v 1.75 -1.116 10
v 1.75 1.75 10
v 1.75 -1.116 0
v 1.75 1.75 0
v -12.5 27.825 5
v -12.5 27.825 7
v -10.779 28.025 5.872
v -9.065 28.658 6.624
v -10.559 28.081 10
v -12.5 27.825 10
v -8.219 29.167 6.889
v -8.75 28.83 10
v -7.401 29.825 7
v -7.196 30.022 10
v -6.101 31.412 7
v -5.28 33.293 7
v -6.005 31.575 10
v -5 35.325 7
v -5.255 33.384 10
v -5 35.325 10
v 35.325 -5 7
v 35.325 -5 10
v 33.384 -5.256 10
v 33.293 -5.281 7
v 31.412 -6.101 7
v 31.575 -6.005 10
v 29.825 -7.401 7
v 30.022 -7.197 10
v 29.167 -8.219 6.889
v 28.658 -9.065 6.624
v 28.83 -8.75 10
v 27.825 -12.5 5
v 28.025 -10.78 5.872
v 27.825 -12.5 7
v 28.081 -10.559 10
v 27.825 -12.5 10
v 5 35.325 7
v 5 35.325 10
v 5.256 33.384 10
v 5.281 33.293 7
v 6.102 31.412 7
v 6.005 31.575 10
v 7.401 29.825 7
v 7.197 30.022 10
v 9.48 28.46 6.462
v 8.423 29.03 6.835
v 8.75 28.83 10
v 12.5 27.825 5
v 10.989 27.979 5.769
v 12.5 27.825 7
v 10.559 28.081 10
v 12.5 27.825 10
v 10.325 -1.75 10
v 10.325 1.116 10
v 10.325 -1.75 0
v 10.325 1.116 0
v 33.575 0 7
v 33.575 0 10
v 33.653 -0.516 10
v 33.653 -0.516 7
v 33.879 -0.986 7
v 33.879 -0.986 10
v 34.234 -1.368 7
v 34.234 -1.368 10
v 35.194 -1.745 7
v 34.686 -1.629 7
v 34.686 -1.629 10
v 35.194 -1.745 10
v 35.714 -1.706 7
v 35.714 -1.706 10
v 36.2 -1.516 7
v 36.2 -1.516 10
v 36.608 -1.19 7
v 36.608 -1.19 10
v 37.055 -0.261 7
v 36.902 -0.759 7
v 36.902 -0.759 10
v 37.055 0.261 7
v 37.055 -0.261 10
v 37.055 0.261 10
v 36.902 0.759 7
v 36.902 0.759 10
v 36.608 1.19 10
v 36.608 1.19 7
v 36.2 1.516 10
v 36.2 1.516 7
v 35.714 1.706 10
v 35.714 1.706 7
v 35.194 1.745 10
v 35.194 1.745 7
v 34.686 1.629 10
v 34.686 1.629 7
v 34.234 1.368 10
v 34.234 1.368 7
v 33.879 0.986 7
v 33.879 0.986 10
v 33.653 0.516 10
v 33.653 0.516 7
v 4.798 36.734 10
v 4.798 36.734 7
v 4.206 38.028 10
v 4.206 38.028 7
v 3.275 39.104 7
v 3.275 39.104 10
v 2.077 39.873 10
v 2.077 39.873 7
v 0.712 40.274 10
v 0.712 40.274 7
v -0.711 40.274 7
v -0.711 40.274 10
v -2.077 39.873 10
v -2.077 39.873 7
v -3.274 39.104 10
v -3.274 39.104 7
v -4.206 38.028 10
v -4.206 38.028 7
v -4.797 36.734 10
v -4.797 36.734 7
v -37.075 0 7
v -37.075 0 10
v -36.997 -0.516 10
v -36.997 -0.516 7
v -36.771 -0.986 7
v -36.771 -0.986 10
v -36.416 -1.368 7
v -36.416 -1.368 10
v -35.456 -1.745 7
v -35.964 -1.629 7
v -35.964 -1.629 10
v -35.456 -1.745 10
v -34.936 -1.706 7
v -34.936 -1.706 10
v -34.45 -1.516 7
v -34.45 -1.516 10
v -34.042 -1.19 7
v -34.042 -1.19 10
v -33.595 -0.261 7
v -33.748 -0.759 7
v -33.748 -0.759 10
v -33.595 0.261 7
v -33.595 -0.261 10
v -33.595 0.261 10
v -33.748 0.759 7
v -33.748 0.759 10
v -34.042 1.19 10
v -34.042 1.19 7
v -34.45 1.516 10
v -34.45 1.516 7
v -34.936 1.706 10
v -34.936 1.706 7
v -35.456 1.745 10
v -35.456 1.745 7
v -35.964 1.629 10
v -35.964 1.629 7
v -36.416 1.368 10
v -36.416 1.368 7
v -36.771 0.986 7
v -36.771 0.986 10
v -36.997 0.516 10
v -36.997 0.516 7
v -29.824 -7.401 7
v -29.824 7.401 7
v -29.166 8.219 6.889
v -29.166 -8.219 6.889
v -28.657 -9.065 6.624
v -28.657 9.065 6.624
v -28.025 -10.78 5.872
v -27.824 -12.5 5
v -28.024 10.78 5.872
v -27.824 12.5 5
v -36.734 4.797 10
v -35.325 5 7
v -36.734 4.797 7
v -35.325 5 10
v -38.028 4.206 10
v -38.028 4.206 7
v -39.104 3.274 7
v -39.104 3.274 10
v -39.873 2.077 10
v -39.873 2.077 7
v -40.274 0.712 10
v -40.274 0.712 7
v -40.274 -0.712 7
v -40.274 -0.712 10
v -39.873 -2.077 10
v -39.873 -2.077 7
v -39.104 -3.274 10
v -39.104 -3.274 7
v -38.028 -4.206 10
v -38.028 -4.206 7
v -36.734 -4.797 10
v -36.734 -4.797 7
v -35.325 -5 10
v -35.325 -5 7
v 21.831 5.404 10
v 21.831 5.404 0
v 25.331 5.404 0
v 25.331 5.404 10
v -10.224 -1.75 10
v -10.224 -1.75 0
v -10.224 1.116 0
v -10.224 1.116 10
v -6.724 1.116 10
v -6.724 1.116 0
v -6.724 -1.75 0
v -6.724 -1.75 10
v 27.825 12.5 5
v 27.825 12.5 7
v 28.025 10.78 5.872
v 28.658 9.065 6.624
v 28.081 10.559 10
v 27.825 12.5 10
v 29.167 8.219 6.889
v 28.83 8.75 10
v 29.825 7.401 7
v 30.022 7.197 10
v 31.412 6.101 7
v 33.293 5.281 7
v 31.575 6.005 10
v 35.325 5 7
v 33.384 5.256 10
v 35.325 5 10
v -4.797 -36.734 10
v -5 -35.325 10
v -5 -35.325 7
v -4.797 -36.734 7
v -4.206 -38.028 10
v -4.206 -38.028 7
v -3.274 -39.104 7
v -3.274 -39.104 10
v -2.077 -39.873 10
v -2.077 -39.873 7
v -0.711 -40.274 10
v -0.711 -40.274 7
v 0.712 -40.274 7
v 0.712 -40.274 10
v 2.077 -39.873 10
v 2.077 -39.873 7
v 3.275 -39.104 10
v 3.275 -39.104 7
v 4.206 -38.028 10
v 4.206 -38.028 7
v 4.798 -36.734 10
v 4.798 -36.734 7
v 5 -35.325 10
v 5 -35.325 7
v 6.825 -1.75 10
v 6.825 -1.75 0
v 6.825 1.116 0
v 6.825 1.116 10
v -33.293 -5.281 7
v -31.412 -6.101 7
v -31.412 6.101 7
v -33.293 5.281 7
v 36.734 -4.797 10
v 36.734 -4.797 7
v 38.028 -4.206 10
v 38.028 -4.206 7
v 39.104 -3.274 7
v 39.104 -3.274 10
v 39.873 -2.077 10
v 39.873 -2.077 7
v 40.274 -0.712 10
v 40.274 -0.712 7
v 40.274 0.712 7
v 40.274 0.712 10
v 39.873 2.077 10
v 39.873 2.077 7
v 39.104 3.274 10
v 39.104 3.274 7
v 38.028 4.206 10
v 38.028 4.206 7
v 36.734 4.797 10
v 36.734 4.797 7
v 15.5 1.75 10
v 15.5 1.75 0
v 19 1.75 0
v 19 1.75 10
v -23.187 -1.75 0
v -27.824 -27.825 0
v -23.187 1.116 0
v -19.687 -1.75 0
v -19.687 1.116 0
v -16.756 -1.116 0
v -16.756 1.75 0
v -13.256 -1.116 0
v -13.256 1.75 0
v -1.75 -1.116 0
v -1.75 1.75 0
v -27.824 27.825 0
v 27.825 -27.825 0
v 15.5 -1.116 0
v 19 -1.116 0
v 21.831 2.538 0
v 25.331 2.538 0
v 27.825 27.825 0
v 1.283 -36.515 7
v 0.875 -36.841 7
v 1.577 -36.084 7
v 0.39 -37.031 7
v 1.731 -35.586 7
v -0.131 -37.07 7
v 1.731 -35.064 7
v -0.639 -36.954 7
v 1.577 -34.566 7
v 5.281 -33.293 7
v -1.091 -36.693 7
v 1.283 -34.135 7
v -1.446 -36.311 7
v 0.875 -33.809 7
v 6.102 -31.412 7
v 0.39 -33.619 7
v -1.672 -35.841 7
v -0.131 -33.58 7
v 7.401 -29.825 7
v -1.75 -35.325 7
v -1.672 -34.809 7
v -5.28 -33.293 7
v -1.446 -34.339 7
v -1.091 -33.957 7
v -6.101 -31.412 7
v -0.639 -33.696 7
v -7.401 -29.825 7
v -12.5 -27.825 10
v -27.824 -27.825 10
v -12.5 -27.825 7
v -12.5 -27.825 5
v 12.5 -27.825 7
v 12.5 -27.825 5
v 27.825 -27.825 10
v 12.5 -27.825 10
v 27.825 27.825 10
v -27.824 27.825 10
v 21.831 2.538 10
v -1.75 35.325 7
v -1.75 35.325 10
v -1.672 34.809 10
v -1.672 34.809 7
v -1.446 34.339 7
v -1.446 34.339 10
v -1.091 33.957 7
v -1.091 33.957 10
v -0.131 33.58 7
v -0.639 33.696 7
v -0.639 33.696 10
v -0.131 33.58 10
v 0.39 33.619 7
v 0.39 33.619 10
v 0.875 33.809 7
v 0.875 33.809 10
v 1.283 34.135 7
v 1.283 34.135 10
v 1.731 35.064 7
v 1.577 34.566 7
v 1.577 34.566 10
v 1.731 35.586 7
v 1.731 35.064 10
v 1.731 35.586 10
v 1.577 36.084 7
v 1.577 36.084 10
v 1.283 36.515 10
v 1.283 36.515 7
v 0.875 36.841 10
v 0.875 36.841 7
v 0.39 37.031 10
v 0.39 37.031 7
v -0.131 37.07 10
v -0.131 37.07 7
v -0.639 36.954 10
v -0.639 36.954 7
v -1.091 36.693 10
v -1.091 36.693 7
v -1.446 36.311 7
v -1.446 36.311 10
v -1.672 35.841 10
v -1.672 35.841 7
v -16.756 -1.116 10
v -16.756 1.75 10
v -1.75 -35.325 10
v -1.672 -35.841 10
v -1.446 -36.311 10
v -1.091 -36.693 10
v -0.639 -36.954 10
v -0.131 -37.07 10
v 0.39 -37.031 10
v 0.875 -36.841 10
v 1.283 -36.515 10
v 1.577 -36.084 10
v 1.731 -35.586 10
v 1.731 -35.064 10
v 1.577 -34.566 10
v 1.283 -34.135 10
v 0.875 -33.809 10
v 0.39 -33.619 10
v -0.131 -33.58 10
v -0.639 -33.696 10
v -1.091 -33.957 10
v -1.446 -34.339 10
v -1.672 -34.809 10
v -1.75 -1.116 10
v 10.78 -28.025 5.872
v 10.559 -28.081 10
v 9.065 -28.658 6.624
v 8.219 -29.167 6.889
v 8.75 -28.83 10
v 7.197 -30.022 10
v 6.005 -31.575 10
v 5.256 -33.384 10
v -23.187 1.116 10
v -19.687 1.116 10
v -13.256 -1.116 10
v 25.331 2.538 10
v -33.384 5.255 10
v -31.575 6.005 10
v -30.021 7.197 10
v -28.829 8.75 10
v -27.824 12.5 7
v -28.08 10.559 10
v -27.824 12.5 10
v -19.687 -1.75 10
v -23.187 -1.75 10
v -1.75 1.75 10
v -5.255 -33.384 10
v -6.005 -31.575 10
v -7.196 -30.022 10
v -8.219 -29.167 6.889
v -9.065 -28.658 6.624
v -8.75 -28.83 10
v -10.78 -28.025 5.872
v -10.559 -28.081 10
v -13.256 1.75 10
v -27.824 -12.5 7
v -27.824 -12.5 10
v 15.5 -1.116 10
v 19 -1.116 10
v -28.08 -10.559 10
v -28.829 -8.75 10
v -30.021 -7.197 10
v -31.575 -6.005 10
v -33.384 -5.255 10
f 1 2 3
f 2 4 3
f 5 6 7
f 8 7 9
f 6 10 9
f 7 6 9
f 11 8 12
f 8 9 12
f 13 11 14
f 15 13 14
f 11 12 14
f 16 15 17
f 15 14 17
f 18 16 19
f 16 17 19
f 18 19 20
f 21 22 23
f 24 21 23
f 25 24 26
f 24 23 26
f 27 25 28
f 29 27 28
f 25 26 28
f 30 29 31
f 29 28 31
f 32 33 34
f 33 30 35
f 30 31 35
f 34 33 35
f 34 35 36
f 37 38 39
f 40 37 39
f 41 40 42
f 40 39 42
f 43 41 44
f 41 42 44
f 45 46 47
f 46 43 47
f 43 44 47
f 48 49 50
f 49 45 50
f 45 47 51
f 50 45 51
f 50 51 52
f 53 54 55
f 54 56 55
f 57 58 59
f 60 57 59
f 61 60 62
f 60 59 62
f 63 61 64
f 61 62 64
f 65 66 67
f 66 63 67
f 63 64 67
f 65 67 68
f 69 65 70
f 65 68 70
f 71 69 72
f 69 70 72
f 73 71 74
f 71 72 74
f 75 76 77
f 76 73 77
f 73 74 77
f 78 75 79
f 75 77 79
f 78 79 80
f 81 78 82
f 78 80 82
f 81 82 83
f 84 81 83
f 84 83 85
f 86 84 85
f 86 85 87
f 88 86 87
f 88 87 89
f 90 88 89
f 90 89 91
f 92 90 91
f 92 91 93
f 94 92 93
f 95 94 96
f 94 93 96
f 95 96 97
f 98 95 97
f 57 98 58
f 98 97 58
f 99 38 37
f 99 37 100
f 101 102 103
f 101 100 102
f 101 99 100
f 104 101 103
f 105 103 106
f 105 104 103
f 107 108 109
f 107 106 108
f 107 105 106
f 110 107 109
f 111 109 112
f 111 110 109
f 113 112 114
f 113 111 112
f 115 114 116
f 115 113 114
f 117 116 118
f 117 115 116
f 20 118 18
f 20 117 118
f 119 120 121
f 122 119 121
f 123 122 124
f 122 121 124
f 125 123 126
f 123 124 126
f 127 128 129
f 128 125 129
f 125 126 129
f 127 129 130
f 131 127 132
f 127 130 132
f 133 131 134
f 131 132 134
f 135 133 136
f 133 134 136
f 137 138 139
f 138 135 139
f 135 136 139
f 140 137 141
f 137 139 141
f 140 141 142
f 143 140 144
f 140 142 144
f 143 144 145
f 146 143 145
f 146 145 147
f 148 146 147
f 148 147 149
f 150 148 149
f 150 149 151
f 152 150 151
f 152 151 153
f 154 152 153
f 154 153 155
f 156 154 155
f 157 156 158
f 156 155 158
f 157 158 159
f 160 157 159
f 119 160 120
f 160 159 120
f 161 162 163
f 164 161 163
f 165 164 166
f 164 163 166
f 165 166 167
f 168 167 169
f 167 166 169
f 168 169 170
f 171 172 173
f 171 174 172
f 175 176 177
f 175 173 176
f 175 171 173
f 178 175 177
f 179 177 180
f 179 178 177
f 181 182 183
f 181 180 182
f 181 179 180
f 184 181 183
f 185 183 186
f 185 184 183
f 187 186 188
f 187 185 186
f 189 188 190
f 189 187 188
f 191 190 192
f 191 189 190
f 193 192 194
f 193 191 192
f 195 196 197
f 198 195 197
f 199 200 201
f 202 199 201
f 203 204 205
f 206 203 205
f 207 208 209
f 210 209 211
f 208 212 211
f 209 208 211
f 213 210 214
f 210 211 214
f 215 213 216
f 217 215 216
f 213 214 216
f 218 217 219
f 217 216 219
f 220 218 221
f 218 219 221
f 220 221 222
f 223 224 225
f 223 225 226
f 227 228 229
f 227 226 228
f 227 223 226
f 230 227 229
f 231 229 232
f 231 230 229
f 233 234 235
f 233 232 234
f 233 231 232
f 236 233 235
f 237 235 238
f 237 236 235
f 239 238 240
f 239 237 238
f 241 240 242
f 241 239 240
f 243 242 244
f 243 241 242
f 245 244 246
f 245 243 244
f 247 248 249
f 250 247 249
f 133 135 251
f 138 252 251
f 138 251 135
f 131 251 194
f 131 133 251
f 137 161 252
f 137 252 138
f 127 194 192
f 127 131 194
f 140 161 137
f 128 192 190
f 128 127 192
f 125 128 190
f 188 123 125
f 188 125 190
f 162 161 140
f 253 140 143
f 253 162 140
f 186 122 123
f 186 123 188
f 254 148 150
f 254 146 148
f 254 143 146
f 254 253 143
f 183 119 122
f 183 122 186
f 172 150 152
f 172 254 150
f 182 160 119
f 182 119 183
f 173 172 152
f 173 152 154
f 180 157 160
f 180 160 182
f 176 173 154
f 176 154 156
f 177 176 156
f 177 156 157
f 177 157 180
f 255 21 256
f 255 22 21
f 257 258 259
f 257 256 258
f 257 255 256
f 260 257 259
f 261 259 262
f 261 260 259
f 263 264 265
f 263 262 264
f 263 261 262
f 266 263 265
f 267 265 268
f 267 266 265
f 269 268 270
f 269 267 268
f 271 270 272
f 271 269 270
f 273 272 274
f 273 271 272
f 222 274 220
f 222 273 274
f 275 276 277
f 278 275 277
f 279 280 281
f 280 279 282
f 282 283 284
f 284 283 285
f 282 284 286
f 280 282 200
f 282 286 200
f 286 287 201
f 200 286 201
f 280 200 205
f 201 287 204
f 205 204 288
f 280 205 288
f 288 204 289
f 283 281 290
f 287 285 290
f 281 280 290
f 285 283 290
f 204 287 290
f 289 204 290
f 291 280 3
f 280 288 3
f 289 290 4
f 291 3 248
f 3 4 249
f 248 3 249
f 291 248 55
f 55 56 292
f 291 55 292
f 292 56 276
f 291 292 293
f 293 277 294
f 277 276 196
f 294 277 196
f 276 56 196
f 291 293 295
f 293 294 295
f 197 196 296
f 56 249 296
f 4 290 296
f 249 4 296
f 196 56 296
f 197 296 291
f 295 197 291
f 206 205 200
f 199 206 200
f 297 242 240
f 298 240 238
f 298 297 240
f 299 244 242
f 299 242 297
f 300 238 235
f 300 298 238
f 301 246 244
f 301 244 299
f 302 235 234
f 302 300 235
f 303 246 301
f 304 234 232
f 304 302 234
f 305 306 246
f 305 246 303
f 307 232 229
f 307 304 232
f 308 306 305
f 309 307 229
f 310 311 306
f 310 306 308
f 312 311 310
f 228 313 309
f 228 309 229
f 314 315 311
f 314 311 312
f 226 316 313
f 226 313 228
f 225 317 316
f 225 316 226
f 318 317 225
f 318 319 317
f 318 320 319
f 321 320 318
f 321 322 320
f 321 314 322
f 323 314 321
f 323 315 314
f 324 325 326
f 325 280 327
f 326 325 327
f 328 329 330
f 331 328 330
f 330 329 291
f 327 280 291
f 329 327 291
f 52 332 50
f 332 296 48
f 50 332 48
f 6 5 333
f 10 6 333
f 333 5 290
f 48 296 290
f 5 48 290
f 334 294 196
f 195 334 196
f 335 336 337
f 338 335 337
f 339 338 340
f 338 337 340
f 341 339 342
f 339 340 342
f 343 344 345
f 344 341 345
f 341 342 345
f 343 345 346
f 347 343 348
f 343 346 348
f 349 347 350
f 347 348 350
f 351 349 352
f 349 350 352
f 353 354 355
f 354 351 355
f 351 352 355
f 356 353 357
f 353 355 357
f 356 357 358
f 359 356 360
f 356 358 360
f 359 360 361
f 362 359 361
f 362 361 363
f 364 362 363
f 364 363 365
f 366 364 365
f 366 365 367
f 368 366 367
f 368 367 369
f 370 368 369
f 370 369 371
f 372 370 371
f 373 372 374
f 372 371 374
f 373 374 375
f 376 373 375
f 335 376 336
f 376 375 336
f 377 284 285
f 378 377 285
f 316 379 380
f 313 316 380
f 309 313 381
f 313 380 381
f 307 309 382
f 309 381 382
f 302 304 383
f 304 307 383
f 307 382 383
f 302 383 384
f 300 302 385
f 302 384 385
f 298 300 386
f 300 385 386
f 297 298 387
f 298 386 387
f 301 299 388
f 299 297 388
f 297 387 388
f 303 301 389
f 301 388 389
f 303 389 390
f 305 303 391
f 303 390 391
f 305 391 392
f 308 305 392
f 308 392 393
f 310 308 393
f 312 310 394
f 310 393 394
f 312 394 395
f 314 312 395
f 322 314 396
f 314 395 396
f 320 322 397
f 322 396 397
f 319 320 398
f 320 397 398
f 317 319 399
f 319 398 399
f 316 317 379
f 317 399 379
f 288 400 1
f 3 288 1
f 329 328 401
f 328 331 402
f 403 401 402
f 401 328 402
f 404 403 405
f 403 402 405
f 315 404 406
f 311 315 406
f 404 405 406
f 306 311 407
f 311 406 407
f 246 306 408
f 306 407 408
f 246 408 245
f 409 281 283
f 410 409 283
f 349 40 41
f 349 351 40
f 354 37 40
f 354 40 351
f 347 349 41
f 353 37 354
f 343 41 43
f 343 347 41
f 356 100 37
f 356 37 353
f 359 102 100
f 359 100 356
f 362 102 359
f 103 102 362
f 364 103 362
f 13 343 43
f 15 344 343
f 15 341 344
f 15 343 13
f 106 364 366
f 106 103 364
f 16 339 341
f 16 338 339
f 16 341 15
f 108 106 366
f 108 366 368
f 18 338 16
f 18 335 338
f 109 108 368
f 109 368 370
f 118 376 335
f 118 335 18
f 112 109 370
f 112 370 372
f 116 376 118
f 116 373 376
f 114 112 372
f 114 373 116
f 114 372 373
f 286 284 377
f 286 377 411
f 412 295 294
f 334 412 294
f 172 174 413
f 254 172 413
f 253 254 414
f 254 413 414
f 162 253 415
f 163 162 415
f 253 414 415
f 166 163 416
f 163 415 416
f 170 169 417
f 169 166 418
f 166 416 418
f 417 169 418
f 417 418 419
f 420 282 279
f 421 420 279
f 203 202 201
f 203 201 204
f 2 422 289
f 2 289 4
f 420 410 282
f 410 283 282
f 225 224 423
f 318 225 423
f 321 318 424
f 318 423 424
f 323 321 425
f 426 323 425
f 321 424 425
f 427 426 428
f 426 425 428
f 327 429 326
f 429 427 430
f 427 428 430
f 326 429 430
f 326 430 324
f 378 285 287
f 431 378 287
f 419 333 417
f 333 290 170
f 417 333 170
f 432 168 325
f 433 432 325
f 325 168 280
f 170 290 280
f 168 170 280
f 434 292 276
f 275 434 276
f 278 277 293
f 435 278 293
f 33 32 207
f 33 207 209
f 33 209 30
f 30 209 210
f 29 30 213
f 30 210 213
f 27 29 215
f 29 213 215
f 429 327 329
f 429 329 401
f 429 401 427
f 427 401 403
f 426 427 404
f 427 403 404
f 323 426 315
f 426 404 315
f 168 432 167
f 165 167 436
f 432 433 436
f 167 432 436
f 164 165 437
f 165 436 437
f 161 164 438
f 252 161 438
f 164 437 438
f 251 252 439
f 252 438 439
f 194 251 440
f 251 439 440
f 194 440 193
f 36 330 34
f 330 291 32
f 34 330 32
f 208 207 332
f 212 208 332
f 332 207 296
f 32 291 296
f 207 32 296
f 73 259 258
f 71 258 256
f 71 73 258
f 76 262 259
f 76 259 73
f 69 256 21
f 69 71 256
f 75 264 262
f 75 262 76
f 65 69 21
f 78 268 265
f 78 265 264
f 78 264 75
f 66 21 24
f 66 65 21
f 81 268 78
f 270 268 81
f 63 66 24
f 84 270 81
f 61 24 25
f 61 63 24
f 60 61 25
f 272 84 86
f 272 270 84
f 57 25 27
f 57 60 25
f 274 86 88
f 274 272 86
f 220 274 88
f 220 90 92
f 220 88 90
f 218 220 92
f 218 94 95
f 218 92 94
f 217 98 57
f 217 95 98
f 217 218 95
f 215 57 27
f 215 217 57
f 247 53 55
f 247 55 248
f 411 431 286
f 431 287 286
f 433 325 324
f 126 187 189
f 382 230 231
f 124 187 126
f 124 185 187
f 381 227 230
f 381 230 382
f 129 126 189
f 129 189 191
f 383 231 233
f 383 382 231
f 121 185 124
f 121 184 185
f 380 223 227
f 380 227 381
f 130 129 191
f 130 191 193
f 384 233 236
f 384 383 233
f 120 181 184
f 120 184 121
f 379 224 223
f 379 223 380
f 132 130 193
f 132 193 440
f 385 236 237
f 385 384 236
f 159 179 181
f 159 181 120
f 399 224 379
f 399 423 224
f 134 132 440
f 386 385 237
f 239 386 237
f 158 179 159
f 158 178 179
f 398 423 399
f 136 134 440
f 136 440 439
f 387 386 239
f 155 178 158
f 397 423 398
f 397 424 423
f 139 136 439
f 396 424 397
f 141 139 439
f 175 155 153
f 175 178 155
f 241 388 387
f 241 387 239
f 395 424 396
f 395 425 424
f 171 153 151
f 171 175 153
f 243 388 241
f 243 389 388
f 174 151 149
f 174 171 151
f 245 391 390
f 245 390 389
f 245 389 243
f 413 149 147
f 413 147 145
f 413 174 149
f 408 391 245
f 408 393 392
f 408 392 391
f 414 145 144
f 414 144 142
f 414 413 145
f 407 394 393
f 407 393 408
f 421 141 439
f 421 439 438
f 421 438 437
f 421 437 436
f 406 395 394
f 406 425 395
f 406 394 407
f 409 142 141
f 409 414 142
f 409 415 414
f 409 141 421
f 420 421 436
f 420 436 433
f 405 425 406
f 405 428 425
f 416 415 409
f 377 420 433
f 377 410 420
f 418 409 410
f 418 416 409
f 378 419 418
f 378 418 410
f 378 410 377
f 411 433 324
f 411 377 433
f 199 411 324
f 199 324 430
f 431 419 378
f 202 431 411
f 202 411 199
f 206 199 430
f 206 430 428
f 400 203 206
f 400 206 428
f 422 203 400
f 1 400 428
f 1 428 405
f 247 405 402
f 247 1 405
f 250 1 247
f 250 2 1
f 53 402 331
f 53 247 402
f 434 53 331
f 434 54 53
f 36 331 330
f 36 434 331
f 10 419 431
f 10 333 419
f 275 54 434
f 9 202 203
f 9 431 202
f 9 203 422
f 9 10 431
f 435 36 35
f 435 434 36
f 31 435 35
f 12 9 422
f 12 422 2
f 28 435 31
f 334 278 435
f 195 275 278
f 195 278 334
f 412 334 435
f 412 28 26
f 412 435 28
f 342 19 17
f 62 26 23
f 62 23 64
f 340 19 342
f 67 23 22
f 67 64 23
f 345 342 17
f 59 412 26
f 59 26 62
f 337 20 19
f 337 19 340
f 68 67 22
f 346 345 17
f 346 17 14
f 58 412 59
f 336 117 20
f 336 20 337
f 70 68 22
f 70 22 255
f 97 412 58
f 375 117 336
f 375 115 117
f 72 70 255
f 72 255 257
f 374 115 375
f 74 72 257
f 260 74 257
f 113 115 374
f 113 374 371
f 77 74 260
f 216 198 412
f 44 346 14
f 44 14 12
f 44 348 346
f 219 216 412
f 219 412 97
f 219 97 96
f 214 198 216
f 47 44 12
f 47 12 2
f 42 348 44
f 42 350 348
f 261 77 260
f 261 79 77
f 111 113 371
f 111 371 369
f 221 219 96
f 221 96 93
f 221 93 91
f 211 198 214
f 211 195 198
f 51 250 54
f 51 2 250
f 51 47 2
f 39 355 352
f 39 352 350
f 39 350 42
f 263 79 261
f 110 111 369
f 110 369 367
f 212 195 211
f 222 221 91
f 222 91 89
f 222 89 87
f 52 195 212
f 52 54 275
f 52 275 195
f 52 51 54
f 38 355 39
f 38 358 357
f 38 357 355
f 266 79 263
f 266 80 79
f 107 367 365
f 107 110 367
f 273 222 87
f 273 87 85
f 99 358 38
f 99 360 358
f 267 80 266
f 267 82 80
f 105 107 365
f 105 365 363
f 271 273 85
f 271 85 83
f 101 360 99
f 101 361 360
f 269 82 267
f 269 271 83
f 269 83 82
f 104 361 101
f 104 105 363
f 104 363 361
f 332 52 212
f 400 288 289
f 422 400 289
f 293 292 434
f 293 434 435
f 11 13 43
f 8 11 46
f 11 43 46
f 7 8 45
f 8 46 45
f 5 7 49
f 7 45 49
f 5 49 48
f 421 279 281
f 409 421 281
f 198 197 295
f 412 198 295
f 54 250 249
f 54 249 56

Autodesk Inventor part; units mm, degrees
ref_plane "YZ Plane" through (0, 0, 0) normal (1, 0, 0) x (0, 1, 0)
ref_plane "XZ Plane" through (0, 0, 0) normal (0, 1, 0) x (-1, 0, 0)
ref_plane "XY Plane" through (0, 0, 0) normal (0, 0, 1) x (1, 0, 0)
sketch "Sketch1" plane through (0, 0, 0) normal (0, 0, 1) x (1, 0, 0)
  circle A0 centre (23.5812, 3.9705) radius 1.4165 construction
  circle A1 centre (17.25, 0) radius 1.4165 construction
  circle A2 centre (8.575, 0) radius 1.4165 construction
  circle A3 centre (0, 0) radius 1.4165 construction
  circle A4 centre (-8.4745, 0) radius 1.4165 construction
  circle A5 centre (-15.0058, 0) radius 1.4165 construction
  circle A6 centre (-21.437, 0) radius 1.4165 construction
  line L0 (25.625, 25.625) -> (-25.6245, 25.625) construction
  line L1 (-25.6245, 25.625) -> (-25.6245, -25.625) construction
  line L2 (-25.6245, -25.625) -> (25.625, -25.625) construction
  line L3 (25.625, -25.625) -> (25.625, 25.625) construction
  line L4 (21.8312, 5.4035) -> (25.3312, 5.4035)
  line L5 (25.3312, 5.4035) -> (25.3312, 2.5375)
  line L6 (25.3312, 2.5375) -> (21.8312, 2.5375)
  line L7 (21.8312, 2.5375) -> (21.8312, 5.4035)
  line L8 (21.8312, 5.4035) -> (25.3312, 2.5375) construction
  line L9 (25.3312, 5.4035) -> (21.8312, 2.5375) construction
  line L10 (15.5, 1.75) -> (19, 1.75)
  line L11 (19, 1.75) -> (19, -1.116)
  line L12 (15.5, -1.116) -> (15.5, 1.75)
  line L13 (6.825, 1.116) -> (10.325, 1.116)
  line L14 (10.325, 1.116) -> (10.325, -1.75)
  line L15 (10.325, -1.75) -> (6.825, -1.75)
  line L16 (6.825, -1.75) -> (6.825, 1.116)
  line L17 (-1.75, 1.75) -> (1.75, 1.75)
  line L18 (1.75, 1.75) -> (1.75, -1.116)
  line L19 (-1.75, -1.116) -> (-1.75, 1.75)
  line L20 (-10.2245, 1.116) -> (-6.7245, 1.116)
  line L21 (-6.7245, 1.116) -> (-6.7245, -1.75)
  line L22 (-6.7245, -1.75) -> (-10.2245, -1.75)
  line L23 (-10.2245, -1.75) -> (-10.2245, 1.116)
  line L24 (-16.7558, 1.75) -> (-13.2558, 1.75)
  line L25 (-13.2558, 1.75) -> (-13.2558, -1.116)
  line L26 (-16.7558, -1.116) -> (-16.7558, 1.75)
  line L27 (-23.187, 1.116) -> (-19.687, 1.116)
  line L28 (-19.687, 1.116) -> (-19.687, -1.75)
  line L29 (-19.687, -1.75) -> (-23.187, -1.75)
  line L30 (-23.187, -1.75) -> (-23.187, 1.116)
  line L31 (25.825, 25.825) -> (-25.8245, 25.825)
  line L32 (-25.8245, 25.825) -> (-25.8245, -25.825)
  line L33 (-25.8245, -25.825) -> (25.825, -25.825)
  line L34 (25.825, -25.825) -> (25.825, 25.825)
  line L35 (27.825, 27.825) -> (-27.8245, 27.825)
  line L36 (-27.8245, 27.825) -> (-27.8245, -27.825)
  line L37 (-27.8245, -27.825) -> (27.825, -27.825)
  line L38 (27.825, -27.825) -> (27.825, 27.825)
  line L39 (-16.7558, -1.116) -> (-13.2558, -1.116)
  line L40 (-1.75, -1.116) -> (1.75, -1.116)
  line L41 (15.5, -1.116) -> (19, -1.116)
  point P0 (0, 0)
  point P1 (-16.6189, -1.116)
  dimension "d0" = 3.5
  dimension "d1" = 2.866
  dimension "d4" = 3.5
  dimension "d5" = 2.866
  dimension "d8" = 3.5
  dimension "d9" = 2.866
  dimension "d12" = 3.5
  dimension "d13" = 2.866
  dimension "d14" = 0.2
  dimension "d15" = 2
extrude "Extrusion1" add sketch "Sketch1" along normal blind 10 contours L34 L33 L32 L31 | L38 L37 L36 L35
sketch "Sketch2" plane through (0, 0, 0) normal (0, 0, -1) x (-1, 0, 0)
  line L0 (27.8245, 27.825) -> (27.8245, -27.825) projected
  line L1 (-27.825, 27.825) -> (27.8245, 27.825) projected
  line L2 (-27.825, -27.825) -> (-27.825, 27.825) projected
  line L3 (27.8245, -27.825) -> (-27.825, -27.825) projected
  line L4 (23.187, -1.75) -> (23.187, 1.116) projected
  line L5 (19.687, -1.75) -> (23.187, -1.75) projected
  line L6 (19.687, 1.116) -> (19.687, -1.75) projected
  line L7 (23.187, 1.116) -> (19.687, 1.116) projected
  line L8 (10.2245, -1.75) -> (10.2245, 1.116) projected
  line L9 (6.7245, -1.75) -> (10.2245, -1.75) projected
  line L10 (6.7245, 1.116) -> (6.7245, -1.75) projected
  line L11 (10.2245, 1.116) -> (6.7245, 1.116) projected
  line L12 (-6.825, -1.75) -> (-6.825, 1.116) projected
  line L13 (-10.325, -1.75) -> (-6.825, -1.75) projected
  line L14 (-10.325, 1.116) -> (-10.325, -1.75) projected
  line L15 (-6.825, 1.116) -> (-10.325, 1.116) projected
  line L16 (-21.8312, 5.4035) -> (-25.3312, 5.4035) projected
  line L17 (-21.8312, 2.5375) -> (-21.8312, 5.4035) projected
  line L18 (-25.3312, 2.5375) -> (-21.8312, 2.5375) projected
  line L19 (-25.3312, 5.4035) -> (-25.3312, 2.5375) projected
  line L20 (25.8245, -25.825) -> (25.8245, 25.825)
  line L21 (25.8245, 25.825) -> (-25.825, 25.825)
  line L22 (-25.825, 25.825) -> (-25.825, -25.825)
  line L23 (-25.825, -25.825) -> (25.8245, -25.825)
  point P0 (0, 0)
  dimension "d18" = 2
extrude "Extrusion2" [suppressed]
ref_plane "Work Plane1" through (0, 0, 10) normal (0, 0, -1) x (-1, 0, 0)
sketch "Sketch3" plane through (0, 0, 10) normal (0, 0, -1) x (-1, 0, 0)
  circle A0 centre (35.325, 0) radius 1.75
  circle A1 centre (-0.0002, -35.325) radius 1.75
  circle A2 centre (-35.325, 0) radius 1.75
  circle A3 centre (-0.0002, 35.325) radius 1.75
  line L0 (7.4998, 35.325) -> (7.4998, 35.325)
  line L1 (-7.5003, 35.325) -> (-7.5003, 35.325)
  arc A4 (4.9998, 35.325) -> (-5.0002, 35.325) centre (-0.0002, 35.325) ccw
  arc A5 (-35.325, 5) -> (-35.325, -5) centre (-35.325, 0) ccw
  arc A6 (35.325, -5) -> (35.325, 5) centre (35.325, 0) ccw
  arc A7 (-5.0002, -35.325) -> (4.9998, -35.325) centre (-0.0002, -35.325) ccw
  line L2 (27.8245, 27.825) -> (-27.825, 27.825) projected
  line L3 (27.8245, -27.825) -> (-27.825, -27.825) projected
  line L4 (-35.325, 5) -> (-35.325, 5)
  line L5 (-5.0002, 35.325) -> (-5.0002, 35.325)
  line L6 (4.9998, 35.325) -> (4.9998, 35.325)
  line L7 (35.325, 5) -> (35.3245, 5)
  line L8 (27.8245, -27.825) -> (27.8245, 27.825) projected
  line L9 (35.325, -5) -> (35.3245, -5)
  line L10 (4.9998, -35.325) -> (4.9998, -35.325)
  line L11 (-5.0002, -35.325) -> (-5.0002, -35.325)
  line L12 (-35.325, -5) -> (-35.325, -5)
  line L13 (-27.825, -27.825) -> (-27.825, -12.5)
  line L14 (-27.825, 12.5) -> (-27.825, 27.825)
  line L15 (27.8245, -27.825) -> (12.4998, -27.825)
  line L16 (-12.5002, -27.825) -> (-27.825, -27.825)
  line L17 (27.8245, 27.825) -> (27.8245, 12.5)
  line L18 (27.8245, -12.5) -> (27.8245, -27.825)
  line L19 (-27.825, 27.825) -> (-12.5002, 27.825)
  line L20 (12.4998, 27.825) -> (27.8245, 27.825)
  arc A8 (-35.325, 5) -> (-27.825, 12.5) centre (-35.325, 12.5) ccw
  arc A9 (-27.825, -12.5) -> (-35.325, -5) centre (-35.325, -12.5) ccw
  arc A10 (-5.0002, -35.325) -> (-12.5002, -27.825) centre (-12.5002, -35.325) ccw
  arc A11 (12.4998, -27.825) -> (4.9998, -35.325) centre (12.4998, -35.325) ccw
  arc A12 (35.3245, -5) -> (27.8245, -12.5) centre (35.3245, -12.5) ccw
  arc A13 (27.8245, 12.5) -> (35.3245, 5) centre (35.3245, 12.5) ccw
  arc A14 (4.9998, 35.325) -> (12.4998, 27.825) centre (12.4998, 35.325) ccw
  arc A15 (-12.5002, 27.825) -> (-5.0002, 35.325) centre (-12.5002, 35.325) ccw
  line L21 (-27.825, -12.5) -> (-27.825, 12.5)
  line L22 (-25.825, -25.825) -> (-25.825, 25.825) projected
  point P0 (27.8245, 5)
  point P1 (27.8245, -5)
  point P2 (-5.0002, -35.325)
  point P3 (4.9998, -35.325)
  point P4 (-5.0002, 35.325)
  dimension "d25" = 10
  dimension "d26" = 10
  dimension "d27" = 7.5
extrude "Extrusion3" add sketch "Sketch3" along normal blind 3 contours A14 L2 A15 A4 | A13 A6 A12 L8 | L21 A9 A5 A8 | A11 A7 A10 L3
fillet "Fillet1" radius 2 4 edges at (-27.8245, 0, 7) (0.0002, 27.825, 7) (27.825, 0, 7) (0.0002, -27.825, 7)
sketch "Sketch4" plane through (0, 0, 0) normal (0, 0, -1) x (-1, 0, 0)
  line L0 (27.8245, 27.825) -> (27.8245, -27.825) construction
  line L1 (-27.825, 27.825) -> (27.8245, 27.825) construction
  line L2 (-27.825, -27.825) -> (-27.825, 27.825) construction
  line L3 (27.8245, -27.825) -> (-27.825, -27.825) construction
  line L4 (-21.8312, 5.4035) -> (-25.3312, 5.4035) construction
  line L5 (-21.8312, 2.5375) -> (-21.8312, 5.4035) construction
  line L6 (-25.3312, 2.5375) -> (-21.8312, 2.5375) construction
  line L7 (-25.3312, 5.4035) -> (-25.3312, 2.5375) construction
  line L8 (-15.5, -1.116) -> (-15.5, 1.75) construction
  line L9 (-19, -1.116) -> (-15.5, -1.116) construction
  line L10 (-19, 1.75) -> (-19, -1.116) construction
  line L11 (-15.5, 1.75) -> (-19, 1.75) construction
  line L12 (-6.825, -1.75) -> (-6.825, 1.116) construction
  line L13 (-10.325, -1.75) -> (-6.825, -1.75) construction
  line L14 (-10.325, 1.116) -> (-10.325, -1.75) construction
  line L15 (-6.825, 1.116) -> (-10.325, 1.116) construction
  line L16 (1.75, -1.116) -> (1.75, 1.75) construction
  line L17 (-1.75, -1.116) -> (1.75, -1.116) construction
  line L18 (-1.75, 1.75) -> (-1.75, -1.116) construction
  line L19 (1.75, 1.75) -> (-1.75, 1.75) construction
  line L20 (10.2245, -1.75) -> (10.2245, 1.116) construction
  line L21 (6.7245, -1.75) -> (10.2245, -1.75) construction
  line L22 (6.7245, 1.116) -> (6.7245, -1.75) construction
  line L23 (10.2245, 1.116) -> (6.7245, 1.116) construction
  line L24 (16.7558, -1.116) -> (16.7558, 1.75) construction
  line L25 (13.2558, -1.116) -> (16.7558, -1.116) construction
  line L26 (13.2558, 1.75) -> (13.2558, -1.116) construction
  line L27 (16.7558, 1.75) -> (13.2558, 1.75) construction
  line L28 (23.187, -1.75) -> (23.187, 1.116) construction
  line L29 (19.687, -1.75) -> (23.187, -1.75) construction
  line L30 (19.687, 1.116) -> (19.687, -1.75) construction
  line L31 (23.187, 1.116) -> (19.687, 1.116) construction
  line L32 (26.8245, -26.825) -> (26.8245, 26.825)
  line L33 (26.8245, 26.825) -> (-26.825, 26.825)
  line L34 (-26.825, 26.825) -> (-26.825, -26.825)
  line L35 (-26.825, -26.825) -> (26.8245, -26.825)
  line L36 (24.187, -2.75) -> (24.187, 2.116)
  line L37 (18.687, 2.116) -> (18.687, -2.75)
  line L38 (17.7558, -2.116) -> (17.7558, 2.75)
  line L39 (12.2558, 2.75) -> (12.2558, -2.116)
  line L40 (11.2245, -2.75) -> (11.2245, 2.116)
  line L41 (5.7245, 2.116) -> (5.7245, -2.75)
  line L42 (2.75, -2.116) -> (2.75, 2.75)
  line L43 (-2.75, 2.75) -> (-2.75, -2.116)
  line L44 (-5.825, -2.75) -> (-5.825, 2.116)
  line L45 (-11.325, 2.116) -> (-11.325, -2.75)
  line L46 (-14.5, 2.75) -> (-14.5, -2.116)
  line L47 (-20, -2.116) -> (-20, 2.75)
  line L48 (-20.8312, 1.5375) -> (-20.8312, 6.4035)
  line L49 (-26.3312, 6.4035) -> (-26.3312, 1.5375)
  line L50 (-23.5812, 26.825) -> (-23.5812, -26.825) construction
  line L51 (-17.25, 26.825) -> (-17.25, -26.825) construction
  line L52 (-0.0002, 26.825) -> (-0.0003, -26.825) construction
  line L53 (8.4745, -26.825) -> (8.4745, 26.825) construction
  line L54 (15.0058, 26.825) -> (15.0057, -26.825) construction
  line L55 (21.437, -26.825) -> (21.437, 26.825) construction
  line L56 (-22.5812, 26.825) -> (-22.5812, 6.4035)
  line L57 (-22.5812, 1.5375) -> (-22.5812, -26.825)
  line L58 (-24.5812, 26.825) -> (-24.5812, 6.4035)
  line L59 (-24.5812, 1.5375) -> (-24.5812, -26.825)
  line L60 (-26.3312, 1.5375) -> (-24.5812, 1.5375)
  line L61 (-22.5812, 1.5375) -> (-20.8312, 1.5375)
  line L62 (-20.8312, 6.4035) -> (-22.5812, 6.4035)
  line L63 (-24.5812, 6.4035) -> (-26.3312, 6.4035)
  line L64 (-20, 2.75) -> (-18.25, 2.75)
  line L65 (-16.25, 2.75) -> (-14.5, 2.75)
  line L66 (-16.25, 26.825) -> (-16.25, 2.75)
  line L67 (-16.25, -2.116) -> (-16.25, -26.825)
  line L68 (-18.25, 26.825) -> (-18.25, 2.75)
  line L69 (-18.25, -2.116) -> (-18.25, -26.825)
  line L70 (-14.5, -2.116) -> (-16.25, -2.116)
  line L71 (-18.25, -2.116) -> (-20, -2.116)
  line L72 (-11.325, -2.75) -> (-9.575, -2.75)
  line L73 (-7.575, -2.75) -> (-5.825, -2.75)
  line L74 (-5.825, 2.116) -> (-7.575, 2.116)
  line L75 (-9.575, 2.116) -> (-11.325, 2.116)
  line L76 (2.75, 2.75) -> (0.9998, 2.75)
  line L77 (-1.0002, 2.75) -> (-2.75, 2.75)
  line L78 (0.9998, 26.825) -> (0.9998, 2.75)
  line L79 (0.9998, -2.116) -> (0.9998, -26.825)
  line L80 (-2.75, -2.116) -> (-1.0002, -2.116)
  line L81 (0.9998, -2.116) -> (2.75, -2.116)
  line L82 (-1.0002, 26.825) -> (-1.0002, 2.75)
  line L83 (-1.0002, -2.116) -> (-1.0002, -26.825)
  line L84 (11.2245, 2.116) -> (9.4745, 2.116)
  line L85 (7.4745, 2.116) -> (5.7245, 2.116)
  line L86 (9.4745, -26.825) -> (9.4745, -2.75)
  line L87 (9.4745, 2.116) -> (9.4745, 26.825)
  line L88 (5.7245, -2.75) -> (7.4745, -2.75)
  line L89 (9.4745, -2.75) -> (11.2245, -2.75)
  line L90 (7.4745, -26.825) -> (7.4745, -2.75)
  line L91 (7.4745, 2.116) -> (7.4745, 26.825)
  line L92 (14.0058, 26.825) -> (14.0058, 2.75)
  line L93 (16.0058, 26.825) -> (16.0058, 2.75)
  line L94 (16.0058, -2.116) -> (16.0057, -26.825)
  line L95 (14.0058, -2.116) -> (14.0057, -26.825)
  line L96 (20.437, 2.116) -> (20.437, 26.825)
  line L97 (22.437, -26.825) -> (22.437, -2.75)
  line L98 (22.437, 2.116) -> (22.437, 26.825)
  line L99 (24.187, 2.116) -> (22.437, 2.116)
  line L100 (20.437, 2.116) -> (18.687, 2.116)
  line L101 (17.7558, 2.75) -> (16.0058, 2.75)
  line L102 (14.0058, 2.75) -> (12.2558, 2.75)
  line L103 (12.2558, -2.116) -> (14.0058, -2.116)
  line L104 (16.0058, -2.116) -> (17.7558, -2.116)
  line L105 (20.437, -26.825) -> (20.437, -2.75)
  line L106 (18.687, -2.75) -> (20.437, -2.75)
  line L107 (22.437, -2.75) -> (24.187, -2.75)
  line L108 (-8.575, 26.825) -> (-8.575, -26.825) construction
  line L109 (-7.575, 26.825) -> (-7.575, 2.116)
  line L110 (-7.575, -2.75) -> (-7.575, -26.825)
  line L111 (-9.575, 26.825) -> (-9.575, 2.116)
  line L112 (-9.575, -2.75) -> (-9.575, -26.825)
  point P0 (0, 0)
  dimension "d4" = 3.5
  dimension "d5" = 2.866
extrude "Extrusion4" [suppressed]
properties part number "frame"
